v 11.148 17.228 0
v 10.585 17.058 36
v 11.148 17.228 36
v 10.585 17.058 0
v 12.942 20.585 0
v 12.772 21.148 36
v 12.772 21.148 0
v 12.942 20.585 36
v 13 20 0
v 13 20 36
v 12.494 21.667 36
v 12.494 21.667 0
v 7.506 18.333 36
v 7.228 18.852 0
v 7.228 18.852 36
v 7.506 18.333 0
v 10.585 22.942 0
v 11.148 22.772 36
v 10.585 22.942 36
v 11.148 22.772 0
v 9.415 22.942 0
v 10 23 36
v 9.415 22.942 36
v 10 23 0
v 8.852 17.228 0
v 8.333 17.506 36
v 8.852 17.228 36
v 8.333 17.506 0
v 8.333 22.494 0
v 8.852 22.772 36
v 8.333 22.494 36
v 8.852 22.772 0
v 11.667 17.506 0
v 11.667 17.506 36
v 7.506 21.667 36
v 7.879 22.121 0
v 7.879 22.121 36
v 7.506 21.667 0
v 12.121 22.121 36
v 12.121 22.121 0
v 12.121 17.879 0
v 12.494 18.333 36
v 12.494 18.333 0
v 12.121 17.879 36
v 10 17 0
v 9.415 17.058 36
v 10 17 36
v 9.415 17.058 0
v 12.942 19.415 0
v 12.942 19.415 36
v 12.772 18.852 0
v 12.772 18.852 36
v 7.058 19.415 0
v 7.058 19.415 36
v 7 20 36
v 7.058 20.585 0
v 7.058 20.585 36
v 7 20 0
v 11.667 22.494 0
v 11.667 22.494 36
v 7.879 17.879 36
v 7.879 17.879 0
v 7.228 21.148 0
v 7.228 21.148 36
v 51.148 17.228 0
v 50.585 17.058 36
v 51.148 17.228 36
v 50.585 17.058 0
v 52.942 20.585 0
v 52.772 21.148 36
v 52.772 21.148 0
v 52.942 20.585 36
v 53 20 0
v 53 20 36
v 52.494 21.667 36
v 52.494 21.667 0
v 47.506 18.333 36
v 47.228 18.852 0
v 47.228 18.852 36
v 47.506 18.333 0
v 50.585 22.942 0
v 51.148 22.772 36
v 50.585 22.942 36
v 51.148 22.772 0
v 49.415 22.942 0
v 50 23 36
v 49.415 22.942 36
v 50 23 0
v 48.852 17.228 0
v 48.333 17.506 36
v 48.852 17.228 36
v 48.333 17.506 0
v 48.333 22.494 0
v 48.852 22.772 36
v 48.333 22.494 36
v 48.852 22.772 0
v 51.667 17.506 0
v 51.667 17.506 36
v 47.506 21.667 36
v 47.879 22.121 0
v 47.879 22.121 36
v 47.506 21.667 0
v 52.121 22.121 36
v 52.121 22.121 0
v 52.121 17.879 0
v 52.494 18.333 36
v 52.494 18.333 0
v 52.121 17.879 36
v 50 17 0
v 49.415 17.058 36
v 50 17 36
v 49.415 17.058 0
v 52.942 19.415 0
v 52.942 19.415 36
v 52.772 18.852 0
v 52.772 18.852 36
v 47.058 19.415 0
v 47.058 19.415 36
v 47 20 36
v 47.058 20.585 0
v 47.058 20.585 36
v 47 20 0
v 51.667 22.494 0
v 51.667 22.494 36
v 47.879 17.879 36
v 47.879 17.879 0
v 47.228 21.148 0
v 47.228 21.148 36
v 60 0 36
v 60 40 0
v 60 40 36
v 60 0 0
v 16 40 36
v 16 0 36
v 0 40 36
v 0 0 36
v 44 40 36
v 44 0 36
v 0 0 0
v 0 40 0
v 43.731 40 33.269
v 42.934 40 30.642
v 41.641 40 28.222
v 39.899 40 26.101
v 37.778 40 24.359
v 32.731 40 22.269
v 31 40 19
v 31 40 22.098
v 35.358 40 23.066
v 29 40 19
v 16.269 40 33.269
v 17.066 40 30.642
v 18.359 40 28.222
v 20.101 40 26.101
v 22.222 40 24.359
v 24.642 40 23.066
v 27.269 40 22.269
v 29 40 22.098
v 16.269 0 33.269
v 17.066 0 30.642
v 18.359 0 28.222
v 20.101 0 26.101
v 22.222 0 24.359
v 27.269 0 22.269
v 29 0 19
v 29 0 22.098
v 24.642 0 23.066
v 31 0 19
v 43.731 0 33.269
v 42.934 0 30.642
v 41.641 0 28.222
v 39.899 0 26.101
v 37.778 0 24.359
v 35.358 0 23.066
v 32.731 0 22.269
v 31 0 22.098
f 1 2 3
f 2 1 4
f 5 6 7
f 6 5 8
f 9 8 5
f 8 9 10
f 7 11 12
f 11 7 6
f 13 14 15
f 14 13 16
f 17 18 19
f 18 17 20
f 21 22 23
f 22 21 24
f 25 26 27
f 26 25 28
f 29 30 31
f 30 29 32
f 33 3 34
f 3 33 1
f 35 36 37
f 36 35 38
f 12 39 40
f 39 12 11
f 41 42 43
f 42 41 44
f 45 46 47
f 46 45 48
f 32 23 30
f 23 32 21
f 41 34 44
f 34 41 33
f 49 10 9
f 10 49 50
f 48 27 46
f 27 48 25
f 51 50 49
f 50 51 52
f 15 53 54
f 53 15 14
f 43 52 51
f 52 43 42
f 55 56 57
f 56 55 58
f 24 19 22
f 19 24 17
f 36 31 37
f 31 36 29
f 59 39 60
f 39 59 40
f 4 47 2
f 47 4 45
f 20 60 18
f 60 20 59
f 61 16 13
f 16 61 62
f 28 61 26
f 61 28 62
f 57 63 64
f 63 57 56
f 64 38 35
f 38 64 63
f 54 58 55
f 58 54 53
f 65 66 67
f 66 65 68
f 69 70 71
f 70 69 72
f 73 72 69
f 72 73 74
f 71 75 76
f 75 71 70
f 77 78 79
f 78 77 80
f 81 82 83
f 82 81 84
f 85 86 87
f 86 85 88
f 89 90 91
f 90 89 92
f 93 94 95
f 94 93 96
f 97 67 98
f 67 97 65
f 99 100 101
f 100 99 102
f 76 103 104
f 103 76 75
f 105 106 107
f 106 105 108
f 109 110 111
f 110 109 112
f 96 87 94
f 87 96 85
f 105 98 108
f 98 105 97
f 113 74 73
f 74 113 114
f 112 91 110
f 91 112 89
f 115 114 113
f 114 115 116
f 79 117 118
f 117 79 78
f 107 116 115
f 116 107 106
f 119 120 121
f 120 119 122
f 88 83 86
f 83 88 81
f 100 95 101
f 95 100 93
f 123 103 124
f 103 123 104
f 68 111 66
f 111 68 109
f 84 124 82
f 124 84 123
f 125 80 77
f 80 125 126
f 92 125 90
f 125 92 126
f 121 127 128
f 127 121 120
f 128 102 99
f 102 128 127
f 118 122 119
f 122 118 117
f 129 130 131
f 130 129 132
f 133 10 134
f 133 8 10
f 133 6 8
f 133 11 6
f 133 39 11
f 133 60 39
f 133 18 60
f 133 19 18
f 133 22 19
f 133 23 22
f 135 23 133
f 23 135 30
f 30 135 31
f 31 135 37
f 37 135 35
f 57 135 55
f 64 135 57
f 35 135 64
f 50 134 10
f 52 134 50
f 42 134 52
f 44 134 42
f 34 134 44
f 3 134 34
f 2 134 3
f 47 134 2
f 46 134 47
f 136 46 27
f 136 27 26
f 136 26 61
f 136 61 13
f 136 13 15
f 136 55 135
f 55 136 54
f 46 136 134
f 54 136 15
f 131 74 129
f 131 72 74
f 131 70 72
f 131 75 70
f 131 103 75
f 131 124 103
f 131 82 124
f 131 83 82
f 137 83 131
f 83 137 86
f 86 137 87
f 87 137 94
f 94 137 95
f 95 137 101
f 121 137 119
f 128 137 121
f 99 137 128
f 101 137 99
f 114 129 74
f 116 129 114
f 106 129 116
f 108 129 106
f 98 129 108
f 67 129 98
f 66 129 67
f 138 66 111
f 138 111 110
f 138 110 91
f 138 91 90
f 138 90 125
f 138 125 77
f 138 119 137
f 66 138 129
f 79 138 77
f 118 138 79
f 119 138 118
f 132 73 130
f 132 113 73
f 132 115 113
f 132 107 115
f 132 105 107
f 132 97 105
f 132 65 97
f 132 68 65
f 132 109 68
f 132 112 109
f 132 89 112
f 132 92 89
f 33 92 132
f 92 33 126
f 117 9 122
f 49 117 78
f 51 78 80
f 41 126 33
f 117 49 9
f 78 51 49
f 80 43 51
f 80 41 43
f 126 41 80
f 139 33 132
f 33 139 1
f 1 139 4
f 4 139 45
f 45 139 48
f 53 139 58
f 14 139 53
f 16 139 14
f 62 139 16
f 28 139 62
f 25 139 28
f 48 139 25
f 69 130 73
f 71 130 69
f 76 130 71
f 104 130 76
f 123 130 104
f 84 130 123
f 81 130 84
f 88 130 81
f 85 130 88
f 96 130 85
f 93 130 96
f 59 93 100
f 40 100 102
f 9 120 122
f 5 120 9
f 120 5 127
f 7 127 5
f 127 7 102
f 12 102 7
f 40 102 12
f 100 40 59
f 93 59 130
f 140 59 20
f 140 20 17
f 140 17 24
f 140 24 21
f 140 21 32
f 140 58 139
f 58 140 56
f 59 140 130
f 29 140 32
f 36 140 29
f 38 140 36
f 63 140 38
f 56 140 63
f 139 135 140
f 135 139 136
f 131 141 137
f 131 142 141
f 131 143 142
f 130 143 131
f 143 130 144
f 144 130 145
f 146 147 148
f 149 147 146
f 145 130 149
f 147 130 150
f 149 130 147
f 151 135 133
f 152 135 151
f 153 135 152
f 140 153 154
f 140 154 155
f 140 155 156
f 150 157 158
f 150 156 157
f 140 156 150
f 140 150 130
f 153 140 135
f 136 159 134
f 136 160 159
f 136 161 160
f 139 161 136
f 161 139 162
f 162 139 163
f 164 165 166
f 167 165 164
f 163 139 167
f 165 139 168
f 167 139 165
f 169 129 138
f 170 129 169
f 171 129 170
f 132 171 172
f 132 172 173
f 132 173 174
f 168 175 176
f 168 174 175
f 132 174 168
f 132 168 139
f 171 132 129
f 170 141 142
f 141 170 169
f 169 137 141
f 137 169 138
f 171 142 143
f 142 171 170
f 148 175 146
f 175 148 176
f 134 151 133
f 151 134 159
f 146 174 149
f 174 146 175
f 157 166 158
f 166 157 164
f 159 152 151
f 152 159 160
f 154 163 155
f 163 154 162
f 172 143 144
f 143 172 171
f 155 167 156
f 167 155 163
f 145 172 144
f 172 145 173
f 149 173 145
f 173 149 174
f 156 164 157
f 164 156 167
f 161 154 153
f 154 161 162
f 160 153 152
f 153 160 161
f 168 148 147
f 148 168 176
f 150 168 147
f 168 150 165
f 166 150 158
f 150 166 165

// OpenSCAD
$fn = 32;

// ----------------------------------------------------------------------
// Saddle clamp: split shaft clamp
// ----------------------------------------------------------------------

// --- parameters (mm) ---
blk_l = 60;               // block length, X
blk_w = 40;               // block width, Y
blk_h = 36;               // block height
clamp_r = 14;             // shaft groove radius
hole_r = 3;               // bolt hole radius
hole_m = 10;              // bolt hole margin from the ends
saw_w = 2;                // saw kerf width

saw_depth = clamp_r + 3;  // saw kerf depth

difference() {
  cube([blk_l, blk_w, blk_h]);
  translate([blk_l / 2, -1, blk_h])
    rotate([-90, 0, 0])
      cylinder(h = blk_w + 2, r = clamp_r);
  for (sx = [0, 1])
    translate([sx ? blk_l - hole_m : hole_m, blk_w / 2, -1])
      cylinder(r = hole_r, h = blk_h + 2);
  translate([blk_l / 2 - saw_w / 2, -1, blk_h - saw_depth])
    cube([saw_w, blk_w + 2, saw_depth + 1]);
}
